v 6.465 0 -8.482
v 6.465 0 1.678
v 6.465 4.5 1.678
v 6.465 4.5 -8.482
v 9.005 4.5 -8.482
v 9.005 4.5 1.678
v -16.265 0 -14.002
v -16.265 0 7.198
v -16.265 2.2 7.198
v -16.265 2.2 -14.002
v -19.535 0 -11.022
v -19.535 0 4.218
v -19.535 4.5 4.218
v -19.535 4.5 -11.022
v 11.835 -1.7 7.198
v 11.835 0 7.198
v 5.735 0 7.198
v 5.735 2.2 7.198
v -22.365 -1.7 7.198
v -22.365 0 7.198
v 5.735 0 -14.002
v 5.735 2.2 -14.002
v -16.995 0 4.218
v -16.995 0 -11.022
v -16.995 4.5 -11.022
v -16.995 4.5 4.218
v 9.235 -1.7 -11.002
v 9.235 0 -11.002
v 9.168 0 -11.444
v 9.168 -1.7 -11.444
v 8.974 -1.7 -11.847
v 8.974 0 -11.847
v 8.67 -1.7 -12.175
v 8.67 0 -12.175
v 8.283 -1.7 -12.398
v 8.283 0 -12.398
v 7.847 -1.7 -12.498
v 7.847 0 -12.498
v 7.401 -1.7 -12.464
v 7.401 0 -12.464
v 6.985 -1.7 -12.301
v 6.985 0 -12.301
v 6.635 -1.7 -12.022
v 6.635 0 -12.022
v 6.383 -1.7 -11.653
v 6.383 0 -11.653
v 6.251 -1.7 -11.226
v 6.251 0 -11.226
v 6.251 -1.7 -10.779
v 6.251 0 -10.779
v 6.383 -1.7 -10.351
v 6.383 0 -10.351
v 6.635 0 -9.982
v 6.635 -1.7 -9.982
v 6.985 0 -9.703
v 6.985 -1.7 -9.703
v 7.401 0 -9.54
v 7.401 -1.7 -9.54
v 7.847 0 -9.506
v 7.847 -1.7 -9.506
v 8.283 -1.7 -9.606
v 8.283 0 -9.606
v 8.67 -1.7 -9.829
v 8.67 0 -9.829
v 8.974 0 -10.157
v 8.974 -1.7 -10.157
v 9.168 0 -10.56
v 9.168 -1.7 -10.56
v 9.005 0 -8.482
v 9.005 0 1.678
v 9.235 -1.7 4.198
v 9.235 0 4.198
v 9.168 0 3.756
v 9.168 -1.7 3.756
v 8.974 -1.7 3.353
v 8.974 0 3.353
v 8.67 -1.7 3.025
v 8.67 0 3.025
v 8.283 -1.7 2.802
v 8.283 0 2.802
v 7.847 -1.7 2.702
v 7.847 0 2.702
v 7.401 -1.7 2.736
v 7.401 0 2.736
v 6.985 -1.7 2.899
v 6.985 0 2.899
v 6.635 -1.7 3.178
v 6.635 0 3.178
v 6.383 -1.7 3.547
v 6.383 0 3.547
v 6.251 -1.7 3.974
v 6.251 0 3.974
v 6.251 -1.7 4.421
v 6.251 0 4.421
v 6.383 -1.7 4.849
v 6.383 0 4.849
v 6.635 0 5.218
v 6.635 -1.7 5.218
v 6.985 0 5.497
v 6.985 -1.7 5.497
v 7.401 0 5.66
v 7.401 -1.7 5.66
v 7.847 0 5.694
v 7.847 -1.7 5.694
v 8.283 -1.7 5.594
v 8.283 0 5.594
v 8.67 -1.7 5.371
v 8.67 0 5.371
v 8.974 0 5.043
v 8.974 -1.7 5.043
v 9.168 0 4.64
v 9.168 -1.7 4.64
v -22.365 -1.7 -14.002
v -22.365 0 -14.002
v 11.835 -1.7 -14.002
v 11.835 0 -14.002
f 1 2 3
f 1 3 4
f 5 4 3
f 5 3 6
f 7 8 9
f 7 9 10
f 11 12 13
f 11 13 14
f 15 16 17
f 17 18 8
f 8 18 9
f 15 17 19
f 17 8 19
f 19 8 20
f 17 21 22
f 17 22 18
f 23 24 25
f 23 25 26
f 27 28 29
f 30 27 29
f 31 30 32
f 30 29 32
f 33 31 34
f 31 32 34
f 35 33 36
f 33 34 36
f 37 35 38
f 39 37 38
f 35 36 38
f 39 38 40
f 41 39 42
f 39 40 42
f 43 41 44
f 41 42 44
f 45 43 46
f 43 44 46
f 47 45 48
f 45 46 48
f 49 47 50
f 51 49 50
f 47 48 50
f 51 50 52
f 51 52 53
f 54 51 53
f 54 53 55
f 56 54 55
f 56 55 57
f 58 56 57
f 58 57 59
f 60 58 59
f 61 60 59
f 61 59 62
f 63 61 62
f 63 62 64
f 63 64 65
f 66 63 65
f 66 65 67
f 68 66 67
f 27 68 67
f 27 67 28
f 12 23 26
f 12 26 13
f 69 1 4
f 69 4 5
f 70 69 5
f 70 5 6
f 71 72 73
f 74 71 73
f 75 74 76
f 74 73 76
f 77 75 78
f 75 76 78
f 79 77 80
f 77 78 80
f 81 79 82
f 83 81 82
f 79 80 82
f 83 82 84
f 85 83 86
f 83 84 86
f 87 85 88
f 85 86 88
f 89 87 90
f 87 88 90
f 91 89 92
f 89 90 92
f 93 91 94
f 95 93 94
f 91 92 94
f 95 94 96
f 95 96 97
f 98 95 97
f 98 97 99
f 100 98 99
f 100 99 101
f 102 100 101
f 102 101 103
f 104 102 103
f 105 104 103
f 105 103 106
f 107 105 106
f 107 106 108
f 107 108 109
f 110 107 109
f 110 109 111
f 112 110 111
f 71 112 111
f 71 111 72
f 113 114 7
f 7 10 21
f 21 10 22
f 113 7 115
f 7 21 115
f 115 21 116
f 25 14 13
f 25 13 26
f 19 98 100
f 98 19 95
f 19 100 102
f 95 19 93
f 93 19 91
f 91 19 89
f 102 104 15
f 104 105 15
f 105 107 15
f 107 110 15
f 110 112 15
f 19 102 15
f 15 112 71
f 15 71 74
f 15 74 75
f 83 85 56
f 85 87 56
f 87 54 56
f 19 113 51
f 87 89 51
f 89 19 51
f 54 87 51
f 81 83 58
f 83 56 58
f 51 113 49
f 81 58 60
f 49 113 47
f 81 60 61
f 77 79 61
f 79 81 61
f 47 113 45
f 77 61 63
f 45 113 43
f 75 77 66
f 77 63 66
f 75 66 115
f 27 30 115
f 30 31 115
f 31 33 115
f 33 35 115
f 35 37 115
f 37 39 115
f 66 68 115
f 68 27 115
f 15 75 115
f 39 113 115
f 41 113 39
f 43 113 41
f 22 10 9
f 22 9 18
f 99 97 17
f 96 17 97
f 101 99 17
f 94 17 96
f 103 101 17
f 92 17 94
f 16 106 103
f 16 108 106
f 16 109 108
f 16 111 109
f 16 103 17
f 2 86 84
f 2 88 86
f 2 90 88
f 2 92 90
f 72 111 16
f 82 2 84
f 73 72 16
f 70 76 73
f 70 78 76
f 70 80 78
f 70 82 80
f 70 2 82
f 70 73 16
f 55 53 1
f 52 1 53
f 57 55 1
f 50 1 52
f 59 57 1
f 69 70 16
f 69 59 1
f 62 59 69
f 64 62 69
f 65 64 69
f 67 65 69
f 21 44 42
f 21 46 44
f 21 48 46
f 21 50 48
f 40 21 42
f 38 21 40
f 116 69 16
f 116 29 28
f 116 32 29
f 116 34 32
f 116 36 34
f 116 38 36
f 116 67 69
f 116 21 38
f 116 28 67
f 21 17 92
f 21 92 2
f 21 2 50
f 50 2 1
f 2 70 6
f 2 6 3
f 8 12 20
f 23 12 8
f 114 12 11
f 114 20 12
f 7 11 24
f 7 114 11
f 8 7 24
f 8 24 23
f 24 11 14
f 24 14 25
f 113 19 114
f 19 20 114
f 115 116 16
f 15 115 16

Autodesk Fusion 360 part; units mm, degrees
sketch "Sketch1" plane through (0, 0, 0) normal (0, 1, 0) x (1, 0, 0)
  line L0 (-22.3654, 14.0021) -> (11.8346, 14.0021)
  line L1 (11.8346, 14.0021) -> (11.8346, -7.1979)
  line L2 (11.8346, -7.1979) -> (-22.3654, -7.1979)
  line L3 (-22.3654, -7.1979) -> (-22.3654, 14.0021)
  line L4 (-19.5354, 11.0221) -> (-16.9954, 11.0221)
  line L5 (-16.9954, 11.0221) -> (-16.9954, -4.2179)
  line L6 (-16.9954, -4.2179) -> (-19.5354, -4.2179)
  line L7 (-19.5354, -4.2179) -> (-19.5354, 11.0221)
  line L8 (6.4646, 8.4821) -> (9.0046, 8.4821)
  line L9 (9.0046, 8.4821) -> (9.0046, -1.6779)
  line L10 (9.0046, -1.6779) -> (6.4646, -1.6779)
  line L11 (6.4646, -1.6779) -> (6.4646, 8.4821)
  line L12 (11.8346, 3.4021) -> (-22.3654, 3.4021) construction
  line L13 (-16.2654, 14.0021) -> (5.7346, 14.0021)
  line L14 (5.7346, 14.0021) -> (5.7346, -7.1979)
  line L15 (5.7346, -7.1979) -> (-16.2654, -7.1979)
  line L16 (-16.2654, -7.1979) -> (-16.2654, 14.0021)
  line L17 (-18.2654, -4.2179) -> (-18.2654, 11.0221) construction
  line L18 (7.7346, -1.6779) -> (7.7346, 8.4821) construction
  circle A0 centre (7.7346, 11.0021) radius 1.5
  circle A1 centre (7.7346, -4.1979) radius 1.5
  line L19 (7.7346, -4.1979) -> (7.7346, 11.0021) construction
  point P0 (-16.9954, 3.4021)
  point P1 (-19.5354, 3.4021)
  point P2 (6.4646, 3.4021)
  point P3 (9.0046, 3.4021)
  dimension "d1" = 34.2
  dimension "d2" = 21.2
  dimension "d3" = 15.24
  dimension "d4" = 2.54
  dimension "d5" = 10.16
  dimension "d6" = 2.54
  dimension "d7" = 22
  dimension "d8" = 4.1
  dimension "d9" = 4.1
  dimension "d16" = 3
  dimension "d17" = 3
  dimension "d18" = 15.2
extrude "Extrude1" add sketch "Sketch1" against normal blind 1.7 contours L0 L2 L3 L16 | L0 L2 L13 L14 L15 L16 | L0 L1 L2 L14 | L4 L5 L6 L7 | L8 L9 L10 L11 | A0 | A1
extrude "Extrude2" add sketch "Sketch1" along normal blind 2.2 contours L0 L2 L13 L14 L15 L16
extrude "Extrude3" add sketch "Sketch1" along normal blind 4.5 contours L4 L5 L6 L7 | L8 L9 L10 L11
extrude "Extrude4" cut sketch "Sketch1" against normal blind 5 contours A0 | A1
